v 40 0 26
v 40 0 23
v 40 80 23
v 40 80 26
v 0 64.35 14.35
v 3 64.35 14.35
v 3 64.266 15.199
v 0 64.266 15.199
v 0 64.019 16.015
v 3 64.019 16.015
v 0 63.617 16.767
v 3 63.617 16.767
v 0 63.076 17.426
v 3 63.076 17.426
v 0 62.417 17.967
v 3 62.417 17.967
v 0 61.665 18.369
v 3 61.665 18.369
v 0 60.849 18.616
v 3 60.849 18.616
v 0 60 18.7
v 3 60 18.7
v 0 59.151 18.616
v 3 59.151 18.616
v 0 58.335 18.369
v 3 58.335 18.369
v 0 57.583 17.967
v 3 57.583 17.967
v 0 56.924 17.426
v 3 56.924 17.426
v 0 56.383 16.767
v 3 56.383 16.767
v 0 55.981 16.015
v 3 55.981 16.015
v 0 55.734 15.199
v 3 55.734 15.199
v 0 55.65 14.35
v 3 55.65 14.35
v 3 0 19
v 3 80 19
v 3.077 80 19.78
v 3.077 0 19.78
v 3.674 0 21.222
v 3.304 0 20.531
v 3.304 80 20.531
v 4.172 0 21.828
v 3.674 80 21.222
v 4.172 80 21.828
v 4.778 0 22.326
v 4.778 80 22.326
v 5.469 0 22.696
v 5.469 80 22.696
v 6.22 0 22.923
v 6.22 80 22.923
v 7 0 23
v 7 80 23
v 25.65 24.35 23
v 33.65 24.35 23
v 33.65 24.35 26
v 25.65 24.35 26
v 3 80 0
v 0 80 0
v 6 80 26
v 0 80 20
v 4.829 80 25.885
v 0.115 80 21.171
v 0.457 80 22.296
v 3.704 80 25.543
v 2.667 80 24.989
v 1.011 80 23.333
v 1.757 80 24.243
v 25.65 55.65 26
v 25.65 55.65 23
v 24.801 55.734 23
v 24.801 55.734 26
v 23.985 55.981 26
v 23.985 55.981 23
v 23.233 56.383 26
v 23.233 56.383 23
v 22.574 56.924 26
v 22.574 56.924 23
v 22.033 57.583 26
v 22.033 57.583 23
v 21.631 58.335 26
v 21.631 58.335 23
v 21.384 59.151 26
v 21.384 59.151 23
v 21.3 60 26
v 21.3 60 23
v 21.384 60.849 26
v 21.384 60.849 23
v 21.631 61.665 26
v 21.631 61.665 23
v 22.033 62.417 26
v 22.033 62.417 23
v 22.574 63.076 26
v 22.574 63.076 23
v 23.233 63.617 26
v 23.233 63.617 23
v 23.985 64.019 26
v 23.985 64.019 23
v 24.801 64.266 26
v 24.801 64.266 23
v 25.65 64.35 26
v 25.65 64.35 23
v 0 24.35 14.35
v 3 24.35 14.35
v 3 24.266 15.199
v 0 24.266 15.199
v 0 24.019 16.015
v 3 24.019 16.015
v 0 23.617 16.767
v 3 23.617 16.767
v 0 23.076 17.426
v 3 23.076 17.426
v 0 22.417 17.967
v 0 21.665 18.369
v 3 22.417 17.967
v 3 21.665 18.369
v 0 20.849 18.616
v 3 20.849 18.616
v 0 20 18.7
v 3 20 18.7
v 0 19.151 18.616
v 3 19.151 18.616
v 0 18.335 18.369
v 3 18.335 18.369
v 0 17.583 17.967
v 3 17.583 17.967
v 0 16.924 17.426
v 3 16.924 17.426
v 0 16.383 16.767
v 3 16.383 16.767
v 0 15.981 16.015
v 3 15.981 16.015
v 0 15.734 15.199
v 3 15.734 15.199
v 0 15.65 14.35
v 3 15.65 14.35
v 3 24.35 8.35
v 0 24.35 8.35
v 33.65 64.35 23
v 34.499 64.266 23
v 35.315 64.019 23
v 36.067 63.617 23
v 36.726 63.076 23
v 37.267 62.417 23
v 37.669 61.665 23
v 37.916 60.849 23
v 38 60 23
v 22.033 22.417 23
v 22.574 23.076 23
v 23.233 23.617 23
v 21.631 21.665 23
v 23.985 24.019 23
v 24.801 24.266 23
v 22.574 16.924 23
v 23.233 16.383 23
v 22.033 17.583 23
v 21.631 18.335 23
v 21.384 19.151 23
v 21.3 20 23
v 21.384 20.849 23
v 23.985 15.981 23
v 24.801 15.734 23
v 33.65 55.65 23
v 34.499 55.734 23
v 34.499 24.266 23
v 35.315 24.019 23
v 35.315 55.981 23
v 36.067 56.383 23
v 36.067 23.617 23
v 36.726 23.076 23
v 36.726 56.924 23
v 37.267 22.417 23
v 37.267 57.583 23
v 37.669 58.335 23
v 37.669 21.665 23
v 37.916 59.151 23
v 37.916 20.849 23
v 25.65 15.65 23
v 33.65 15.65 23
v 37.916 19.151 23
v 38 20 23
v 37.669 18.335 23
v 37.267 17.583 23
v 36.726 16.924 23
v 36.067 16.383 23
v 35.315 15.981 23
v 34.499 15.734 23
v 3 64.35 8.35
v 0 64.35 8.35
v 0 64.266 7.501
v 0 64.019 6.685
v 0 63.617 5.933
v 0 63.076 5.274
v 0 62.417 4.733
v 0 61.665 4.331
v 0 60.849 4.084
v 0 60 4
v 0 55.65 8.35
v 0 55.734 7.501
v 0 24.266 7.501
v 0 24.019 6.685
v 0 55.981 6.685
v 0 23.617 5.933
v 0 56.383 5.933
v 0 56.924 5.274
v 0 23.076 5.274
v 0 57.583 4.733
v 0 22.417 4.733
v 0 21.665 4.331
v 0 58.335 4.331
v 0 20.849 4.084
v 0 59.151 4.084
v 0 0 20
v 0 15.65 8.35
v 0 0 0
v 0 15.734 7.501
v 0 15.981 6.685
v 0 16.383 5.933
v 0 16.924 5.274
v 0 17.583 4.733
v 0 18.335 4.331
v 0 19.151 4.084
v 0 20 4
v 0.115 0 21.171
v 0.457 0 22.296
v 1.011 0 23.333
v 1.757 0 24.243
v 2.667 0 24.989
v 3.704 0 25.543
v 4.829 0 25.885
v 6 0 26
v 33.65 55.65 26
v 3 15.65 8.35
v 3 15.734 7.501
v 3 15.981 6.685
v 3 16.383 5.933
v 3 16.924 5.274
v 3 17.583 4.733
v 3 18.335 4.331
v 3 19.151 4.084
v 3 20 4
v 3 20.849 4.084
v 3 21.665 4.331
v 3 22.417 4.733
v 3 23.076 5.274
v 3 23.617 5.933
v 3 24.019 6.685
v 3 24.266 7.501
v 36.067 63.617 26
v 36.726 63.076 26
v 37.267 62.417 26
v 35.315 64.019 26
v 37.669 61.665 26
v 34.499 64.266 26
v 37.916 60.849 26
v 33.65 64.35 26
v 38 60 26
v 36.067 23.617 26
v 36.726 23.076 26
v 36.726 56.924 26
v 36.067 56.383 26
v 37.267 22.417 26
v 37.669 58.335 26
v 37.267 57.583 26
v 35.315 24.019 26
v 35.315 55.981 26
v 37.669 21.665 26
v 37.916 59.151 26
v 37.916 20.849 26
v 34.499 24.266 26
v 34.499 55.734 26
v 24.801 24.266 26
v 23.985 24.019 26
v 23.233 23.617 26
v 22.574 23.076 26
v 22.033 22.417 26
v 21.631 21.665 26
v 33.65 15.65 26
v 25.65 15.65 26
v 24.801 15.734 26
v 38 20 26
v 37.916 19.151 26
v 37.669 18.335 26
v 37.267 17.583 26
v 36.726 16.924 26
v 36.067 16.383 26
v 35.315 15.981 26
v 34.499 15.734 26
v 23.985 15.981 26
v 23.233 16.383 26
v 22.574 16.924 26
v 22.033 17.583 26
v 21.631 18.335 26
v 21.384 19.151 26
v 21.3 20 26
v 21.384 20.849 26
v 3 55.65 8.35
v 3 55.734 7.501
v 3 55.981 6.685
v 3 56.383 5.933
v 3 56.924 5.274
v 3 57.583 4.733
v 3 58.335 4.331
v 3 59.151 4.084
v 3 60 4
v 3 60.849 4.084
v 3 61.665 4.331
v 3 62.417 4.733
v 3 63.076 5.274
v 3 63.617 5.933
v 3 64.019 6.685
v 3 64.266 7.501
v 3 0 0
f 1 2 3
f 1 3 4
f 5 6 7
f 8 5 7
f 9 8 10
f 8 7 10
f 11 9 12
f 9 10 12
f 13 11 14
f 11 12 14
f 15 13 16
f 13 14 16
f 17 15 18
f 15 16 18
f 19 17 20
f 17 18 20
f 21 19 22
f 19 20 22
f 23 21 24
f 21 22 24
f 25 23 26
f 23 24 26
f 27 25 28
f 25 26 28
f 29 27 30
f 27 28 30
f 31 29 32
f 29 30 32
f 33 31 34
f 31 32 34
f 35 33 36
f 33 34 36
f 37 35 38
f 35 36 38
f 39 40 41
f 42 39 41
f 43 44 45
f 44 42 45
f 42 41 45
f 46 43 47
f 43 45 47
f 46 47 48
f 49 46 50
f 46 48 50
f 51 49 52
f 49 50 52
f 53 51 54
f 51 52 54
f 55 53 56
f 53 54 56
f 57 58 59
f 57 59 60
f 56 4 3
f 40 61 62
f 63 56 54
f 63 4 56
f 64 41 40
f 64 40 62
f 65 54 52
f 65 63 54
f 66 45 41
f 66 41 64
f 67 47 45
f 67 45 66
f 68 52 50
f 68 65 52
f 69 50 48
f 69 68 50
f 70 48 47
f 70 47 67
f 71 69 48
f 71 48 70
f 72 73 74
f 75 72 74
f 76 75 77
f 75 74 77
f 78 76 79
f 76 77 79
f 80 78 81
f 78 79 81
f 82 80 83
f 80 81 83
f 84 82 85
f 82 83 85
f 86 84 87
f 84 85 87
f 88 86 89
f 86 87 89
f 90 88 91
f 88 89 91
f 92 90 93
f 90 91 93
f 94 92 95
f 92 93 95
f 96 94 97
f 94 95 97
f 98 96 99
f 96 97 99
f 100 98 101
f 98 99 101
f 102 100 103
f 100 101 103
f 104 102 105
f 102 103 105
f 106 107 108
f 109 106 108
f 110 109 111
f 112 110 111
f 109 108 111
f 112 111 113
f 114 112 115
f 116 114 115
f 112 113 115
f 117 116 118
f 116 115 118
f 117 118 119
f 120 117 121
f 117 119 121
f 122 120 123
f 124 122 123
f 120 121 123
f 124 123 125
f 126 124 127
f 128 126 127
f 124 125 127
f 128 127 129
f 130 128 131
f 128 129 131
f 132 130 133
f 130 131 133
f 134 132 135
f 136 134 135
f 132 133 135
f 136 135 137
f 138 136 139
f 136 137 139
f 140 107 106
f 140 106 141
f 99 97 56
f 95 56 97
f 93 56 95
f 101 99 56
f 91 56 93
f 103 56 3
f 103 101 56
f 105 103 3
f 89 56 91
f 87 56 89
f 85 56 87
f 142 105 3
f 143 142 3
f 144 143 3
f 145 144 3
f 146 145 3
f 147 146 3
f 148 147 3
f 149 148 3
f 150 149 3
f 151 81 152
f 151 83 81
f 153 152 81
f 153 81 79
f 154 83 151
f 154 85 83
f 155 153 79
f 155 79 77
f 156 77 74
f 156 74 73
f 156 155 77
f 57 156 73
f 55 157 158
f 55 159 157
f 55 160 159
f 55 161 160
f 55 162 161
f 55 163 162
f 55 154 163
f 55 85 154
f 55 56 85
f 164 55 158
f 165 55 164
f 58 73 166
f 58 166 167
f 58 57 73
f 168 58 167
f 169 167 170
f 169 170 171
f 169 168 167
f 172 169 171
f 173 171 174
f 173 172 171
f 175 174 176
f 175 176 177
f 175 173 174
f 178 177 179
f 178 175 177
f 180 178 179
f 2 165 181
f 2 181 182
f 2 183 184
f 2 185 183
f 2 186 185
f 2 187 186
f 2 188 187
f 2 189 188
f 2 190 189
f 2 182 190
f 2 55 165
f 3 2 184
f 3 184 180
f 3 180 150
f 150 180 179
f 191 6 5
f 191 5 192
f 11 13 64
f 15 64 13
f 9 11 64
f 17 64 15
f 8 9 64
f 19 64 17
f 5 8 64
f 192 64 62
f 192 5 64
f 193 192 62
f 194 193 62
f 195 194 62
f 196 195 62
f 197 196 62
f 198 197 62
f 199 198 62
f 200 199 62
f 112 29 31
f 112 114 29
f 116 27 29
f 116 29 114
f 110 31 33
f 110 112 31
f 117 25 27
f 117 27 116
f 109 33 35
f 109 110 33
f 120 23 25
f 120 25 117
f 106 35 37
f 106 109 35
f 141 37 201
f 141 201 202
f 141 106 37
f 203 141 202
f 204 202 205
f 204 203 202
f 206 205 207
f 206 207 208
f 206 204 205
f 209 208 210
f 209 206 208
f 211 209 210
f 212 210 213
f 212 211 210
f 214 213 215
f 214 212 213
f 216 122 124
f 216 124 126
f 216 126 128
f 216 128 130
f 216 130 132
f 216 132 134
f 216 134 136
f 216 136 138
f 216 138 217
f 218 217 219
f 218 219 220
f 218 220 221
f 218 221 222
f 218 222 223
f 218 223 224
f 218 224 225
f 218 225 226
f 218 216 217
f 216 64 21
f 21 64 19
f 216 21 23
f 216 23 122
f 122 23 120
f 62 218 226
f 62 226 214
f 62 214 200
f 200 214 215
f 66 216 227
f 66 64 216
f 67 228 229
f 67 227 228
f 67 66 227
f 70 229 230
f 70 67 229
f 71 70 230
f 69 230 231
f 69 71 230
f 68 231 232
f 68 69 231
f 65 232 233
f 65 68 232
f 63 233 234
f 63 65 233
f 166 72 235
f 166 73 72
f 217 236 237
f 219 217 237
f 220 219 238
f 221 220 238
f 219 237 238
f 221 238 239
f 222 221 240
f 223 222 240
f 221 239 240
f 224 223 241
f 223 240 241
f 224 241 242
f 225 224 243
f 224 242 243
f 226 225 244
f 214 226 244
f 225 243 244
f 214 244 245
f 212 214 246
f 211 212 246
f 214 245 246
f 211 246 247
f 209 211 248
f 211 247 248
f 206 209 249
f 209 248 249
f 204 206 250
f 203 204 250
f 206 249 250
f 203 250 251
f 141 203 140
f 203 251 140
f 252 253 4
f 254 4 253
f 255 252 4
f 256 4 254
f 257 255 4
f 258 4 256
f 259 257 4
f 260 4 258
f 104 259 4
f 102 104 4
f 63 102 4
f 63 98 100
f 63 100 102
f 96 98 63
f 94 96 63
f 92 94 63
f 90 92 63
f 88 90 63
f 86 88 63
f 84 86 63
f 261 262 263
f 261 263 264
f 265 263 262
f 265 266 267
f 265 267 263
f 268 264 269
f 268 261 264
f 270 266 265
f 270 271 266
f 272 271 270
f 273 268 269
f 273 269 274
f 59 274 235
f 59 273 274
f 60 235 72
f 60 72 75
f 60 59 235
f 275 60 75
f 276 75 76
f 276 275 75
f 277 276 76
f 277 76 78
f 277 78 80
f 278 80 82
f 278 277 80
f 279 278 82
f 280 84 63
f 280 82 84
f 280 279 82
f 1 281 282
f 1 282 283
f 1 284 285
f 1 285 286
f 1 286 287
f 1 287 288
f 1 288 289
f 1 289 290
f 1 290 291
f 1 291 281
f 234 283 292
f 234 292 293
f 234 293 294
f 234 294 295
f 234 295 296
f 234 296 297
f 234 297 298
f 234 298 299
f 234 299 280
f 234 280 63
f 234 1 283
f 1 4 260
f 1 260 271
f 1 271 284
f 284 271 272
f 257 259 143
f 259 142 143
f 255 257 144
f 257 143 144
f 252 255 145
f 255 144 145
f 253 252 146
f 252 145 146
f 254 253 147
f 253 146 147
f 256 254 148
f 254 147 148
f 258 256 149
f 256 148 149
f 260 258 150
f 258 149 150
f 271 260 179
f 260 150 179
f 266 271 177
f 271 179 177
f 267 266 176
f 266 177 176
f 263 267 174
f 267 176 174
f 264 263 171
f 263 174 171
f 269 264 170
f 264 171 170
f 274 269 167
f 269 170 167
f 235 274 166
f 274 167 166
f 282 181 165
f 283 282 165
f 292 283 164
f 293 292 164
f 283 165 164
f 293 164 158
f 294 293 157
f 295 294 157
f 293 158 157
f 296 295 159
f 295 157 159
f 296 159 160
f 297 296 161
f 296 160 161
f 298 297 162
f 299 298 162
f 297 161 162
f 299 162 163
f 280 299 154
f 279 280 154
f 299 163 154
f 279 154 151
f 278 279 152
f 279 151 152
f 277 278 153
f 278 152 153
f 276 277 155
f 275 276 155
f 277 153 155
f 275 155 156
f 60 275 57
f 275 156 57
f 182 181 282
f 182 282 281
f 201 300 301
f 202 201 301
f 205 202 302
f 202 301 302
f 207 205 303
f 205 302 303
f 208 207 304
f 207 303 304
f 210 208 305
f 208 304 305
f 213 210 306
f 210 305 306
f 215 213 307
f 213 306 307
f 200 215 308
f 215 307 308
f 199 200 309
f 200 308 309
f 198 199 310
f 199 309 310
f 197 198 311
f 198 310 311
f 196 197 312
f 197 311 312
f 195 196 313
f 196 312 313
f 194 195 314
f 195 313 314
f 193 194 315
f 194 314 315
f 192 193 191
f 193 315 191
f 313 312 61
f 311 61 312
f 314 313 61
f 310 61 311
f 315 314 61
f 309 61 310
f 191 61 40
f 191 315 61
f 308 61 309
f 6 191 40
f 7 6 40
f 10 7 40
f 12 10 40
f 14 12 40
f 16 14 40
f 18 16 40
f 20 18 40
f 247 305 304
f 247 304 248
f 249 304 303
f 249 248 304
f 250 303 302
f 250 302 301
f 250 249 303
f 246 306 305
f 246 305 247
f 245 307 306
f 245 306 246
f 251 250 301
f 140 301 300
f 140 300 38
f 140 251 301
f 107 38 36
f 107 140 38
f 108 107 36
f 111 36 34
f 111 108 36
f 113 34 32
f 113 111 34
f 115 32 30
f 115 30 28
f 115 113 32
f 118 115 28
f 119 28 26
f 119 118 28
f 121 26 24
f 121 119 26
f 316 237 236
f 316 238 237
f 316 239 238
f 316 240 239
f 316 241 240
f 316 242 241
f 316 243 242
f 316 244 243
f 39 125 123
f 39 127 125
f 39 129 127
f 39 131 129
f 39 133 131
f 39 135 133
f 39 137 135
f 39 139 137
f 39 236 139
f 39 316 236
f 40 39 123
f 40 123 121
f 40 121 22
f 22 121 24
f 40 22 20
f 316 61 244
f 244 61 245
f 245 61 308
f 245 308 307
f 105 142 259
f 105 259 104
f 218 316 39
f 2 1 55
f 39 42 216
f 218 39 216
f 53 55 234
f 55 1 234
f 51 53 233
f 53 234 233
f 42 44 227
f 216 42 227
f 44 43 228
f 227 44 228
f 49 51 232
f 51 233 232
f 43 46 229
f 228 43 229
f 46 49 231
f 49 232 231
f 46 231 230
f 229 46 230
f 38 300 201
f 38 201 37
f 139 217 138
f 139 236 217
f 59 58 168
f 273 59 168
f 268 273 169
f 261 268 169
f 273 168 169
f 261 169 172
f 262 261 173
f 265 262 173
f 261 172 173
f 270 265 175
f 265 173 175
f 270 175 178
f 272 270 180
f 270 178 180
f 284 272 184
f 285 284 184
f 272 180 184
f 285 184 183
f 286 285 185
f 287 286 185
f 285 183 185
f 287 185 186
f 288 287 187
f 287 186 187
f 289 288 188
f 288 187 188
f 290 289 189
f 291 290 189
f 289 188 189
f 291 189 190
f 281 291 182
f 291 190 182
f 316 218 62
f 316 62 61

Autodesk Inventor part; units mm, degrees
sketch "Skizze1" plane through (0, 0, 0) normal (0, 1, 0) x (-1, 0, 0)
  line L0 (0, 0) -> (-3, 0)
  line L1 (-3, 0) -> (-3, 23)
  line L2 (-3, 23) -> (-40, 23)
  line L3 (-40, 23) -> (-40, 26)
  line L4 (-40, 26) -> (0, 26)
  line L5 (0, 26) -> (0, 0)
  line L6 (0, -5.2) -> (0, 31.2) projected
  line L7 (8, 0) -> (-48, 0) projected
  point P0 (0, 0)
  dimension "d0" = 3
  dimension "d1" = 3
  dimension "d2" = 40
  dimension "d3" = 26
extrude "Extrusion1" add sketch "Skizze1" along normal blind 80
fillet "Rundung1" radius 6 1 edges at (0, 40, 26)
fillet "Rundung2" radius 4 1 edges at (3, 40, 23)
sketch "Skizze2" plane through (3, 0, 0) normal (1, 0, 0) x (0, 0, -1)
  arc A0 (-14.35, 24.35) -> (-14.35, 15.65) centre (-14.35, 20) ccw
  arc A1 (-8.35, 15.65) -> (-8.35, 24.35) centre (-8.35, 20) ccw
  line L0 (-14.35, 24.35) -> (-8.35, 24.35)
  line L1 (-8.35, 15.65) -> (-14.35, 15.65)
  line L2 (-31.2, 0) -> (5.2, 0) projected
  line L3 (0, 0) -> (0, 80) projected
  point P0 (-4, 20)
  dimension "d17" = 8.7
  dimension "d18" = 6
  dimension "d19" = 20
  dimension "d20" = 8.7
  dimension "d21" = 4
extrude "Extrusion2" cut sketch "Skizze2" against normal through all
ref_plane "Arbeitsebene1" through (0, 40, 0) normal (0, 1, 0) x (-1, 0, 0)
mirror "Spiegeln1" about plane through (0, 40, 0) normal (0, 1, 0) of "Extrusion2"
sketch "Skizze3" plane through (40, 0, 23) normal (0, 0, -1) x (-1, 0, 0)
  arc A0 (6.35, 24.35) -> (6.35, 15.65) centre (6.35, 20) ccw
  arc A1 (14.35, 15.65) -> (14.35, 24.35) centre (14.35, 20) ccw
  line L0 (6.35, 24.35) -> (14.35, 24.35)
  line L1 (14.35, 15.65) -> (6.35, 15.65)
  line L2 (48, 0) -> (-8, 0) projected
  line L3 (0, 0) -> (0, 80) projected
  point P0 (40, 0)
  point P1 (2, 20)
  dimension "d23" = 8.7
  dimension "d24" = 8
  dimension "d25" = 20
  dimension "d26" = 2
extrude "Extrusion3" cut sketch "Skizze3" against normal blind 10
mirror "Spiegeln2" about plane through (0, 40, 0) normal (0, 1, 0) of "Extrusion3"
ref_plane "Arbeitsebene2" through (3, 20, 8.35) normal (0, -1, 0) x (1, 0, 0)
ref_plane "Arbeitsebene3" through (0, 60, 8.35) normal (0, -1, 0) x (1, 0, 0)
ref_plane "Arbeitsebene4" through (3, 0, 11.35) normal (0, 0, -1) x (-1, 0, 0)
ref_plane "Arbeitsebene5" through (0, 20, 0) normal (0, -1, 0) x (1, 0, 0)
ref_plane "Arbeitsebene6" through (0, 60, 0) normal (0, 1, 0) x (1, 0, 0)
ref_plane "Arbeitsebene7" through (29.65, 0, 26) normal (1, 0, 0) x (0, 0, -1)
equation "\"Biegeradius\" = Stärke"
equation "\"BreiteBiegungsfreistellung\" = Stärke"
equation "\"TiefeBiegungsfreistellung\" = 0.5 * Stärke"
equation "\"GrößeEckenfreistellung\" = 4 * Stärke"
equation "\"MinimalRest\" = 2 * Stärke"
equation "\"Übergangsradius\" = Biegeradius"
equation "\"JacobiRadiusGröße\" = Biegeradius"
equation "\"Abstandsgröße\" = Stärke"
equation "\"Stärke\" = 0.5"
properties part number "Winkelblech"
